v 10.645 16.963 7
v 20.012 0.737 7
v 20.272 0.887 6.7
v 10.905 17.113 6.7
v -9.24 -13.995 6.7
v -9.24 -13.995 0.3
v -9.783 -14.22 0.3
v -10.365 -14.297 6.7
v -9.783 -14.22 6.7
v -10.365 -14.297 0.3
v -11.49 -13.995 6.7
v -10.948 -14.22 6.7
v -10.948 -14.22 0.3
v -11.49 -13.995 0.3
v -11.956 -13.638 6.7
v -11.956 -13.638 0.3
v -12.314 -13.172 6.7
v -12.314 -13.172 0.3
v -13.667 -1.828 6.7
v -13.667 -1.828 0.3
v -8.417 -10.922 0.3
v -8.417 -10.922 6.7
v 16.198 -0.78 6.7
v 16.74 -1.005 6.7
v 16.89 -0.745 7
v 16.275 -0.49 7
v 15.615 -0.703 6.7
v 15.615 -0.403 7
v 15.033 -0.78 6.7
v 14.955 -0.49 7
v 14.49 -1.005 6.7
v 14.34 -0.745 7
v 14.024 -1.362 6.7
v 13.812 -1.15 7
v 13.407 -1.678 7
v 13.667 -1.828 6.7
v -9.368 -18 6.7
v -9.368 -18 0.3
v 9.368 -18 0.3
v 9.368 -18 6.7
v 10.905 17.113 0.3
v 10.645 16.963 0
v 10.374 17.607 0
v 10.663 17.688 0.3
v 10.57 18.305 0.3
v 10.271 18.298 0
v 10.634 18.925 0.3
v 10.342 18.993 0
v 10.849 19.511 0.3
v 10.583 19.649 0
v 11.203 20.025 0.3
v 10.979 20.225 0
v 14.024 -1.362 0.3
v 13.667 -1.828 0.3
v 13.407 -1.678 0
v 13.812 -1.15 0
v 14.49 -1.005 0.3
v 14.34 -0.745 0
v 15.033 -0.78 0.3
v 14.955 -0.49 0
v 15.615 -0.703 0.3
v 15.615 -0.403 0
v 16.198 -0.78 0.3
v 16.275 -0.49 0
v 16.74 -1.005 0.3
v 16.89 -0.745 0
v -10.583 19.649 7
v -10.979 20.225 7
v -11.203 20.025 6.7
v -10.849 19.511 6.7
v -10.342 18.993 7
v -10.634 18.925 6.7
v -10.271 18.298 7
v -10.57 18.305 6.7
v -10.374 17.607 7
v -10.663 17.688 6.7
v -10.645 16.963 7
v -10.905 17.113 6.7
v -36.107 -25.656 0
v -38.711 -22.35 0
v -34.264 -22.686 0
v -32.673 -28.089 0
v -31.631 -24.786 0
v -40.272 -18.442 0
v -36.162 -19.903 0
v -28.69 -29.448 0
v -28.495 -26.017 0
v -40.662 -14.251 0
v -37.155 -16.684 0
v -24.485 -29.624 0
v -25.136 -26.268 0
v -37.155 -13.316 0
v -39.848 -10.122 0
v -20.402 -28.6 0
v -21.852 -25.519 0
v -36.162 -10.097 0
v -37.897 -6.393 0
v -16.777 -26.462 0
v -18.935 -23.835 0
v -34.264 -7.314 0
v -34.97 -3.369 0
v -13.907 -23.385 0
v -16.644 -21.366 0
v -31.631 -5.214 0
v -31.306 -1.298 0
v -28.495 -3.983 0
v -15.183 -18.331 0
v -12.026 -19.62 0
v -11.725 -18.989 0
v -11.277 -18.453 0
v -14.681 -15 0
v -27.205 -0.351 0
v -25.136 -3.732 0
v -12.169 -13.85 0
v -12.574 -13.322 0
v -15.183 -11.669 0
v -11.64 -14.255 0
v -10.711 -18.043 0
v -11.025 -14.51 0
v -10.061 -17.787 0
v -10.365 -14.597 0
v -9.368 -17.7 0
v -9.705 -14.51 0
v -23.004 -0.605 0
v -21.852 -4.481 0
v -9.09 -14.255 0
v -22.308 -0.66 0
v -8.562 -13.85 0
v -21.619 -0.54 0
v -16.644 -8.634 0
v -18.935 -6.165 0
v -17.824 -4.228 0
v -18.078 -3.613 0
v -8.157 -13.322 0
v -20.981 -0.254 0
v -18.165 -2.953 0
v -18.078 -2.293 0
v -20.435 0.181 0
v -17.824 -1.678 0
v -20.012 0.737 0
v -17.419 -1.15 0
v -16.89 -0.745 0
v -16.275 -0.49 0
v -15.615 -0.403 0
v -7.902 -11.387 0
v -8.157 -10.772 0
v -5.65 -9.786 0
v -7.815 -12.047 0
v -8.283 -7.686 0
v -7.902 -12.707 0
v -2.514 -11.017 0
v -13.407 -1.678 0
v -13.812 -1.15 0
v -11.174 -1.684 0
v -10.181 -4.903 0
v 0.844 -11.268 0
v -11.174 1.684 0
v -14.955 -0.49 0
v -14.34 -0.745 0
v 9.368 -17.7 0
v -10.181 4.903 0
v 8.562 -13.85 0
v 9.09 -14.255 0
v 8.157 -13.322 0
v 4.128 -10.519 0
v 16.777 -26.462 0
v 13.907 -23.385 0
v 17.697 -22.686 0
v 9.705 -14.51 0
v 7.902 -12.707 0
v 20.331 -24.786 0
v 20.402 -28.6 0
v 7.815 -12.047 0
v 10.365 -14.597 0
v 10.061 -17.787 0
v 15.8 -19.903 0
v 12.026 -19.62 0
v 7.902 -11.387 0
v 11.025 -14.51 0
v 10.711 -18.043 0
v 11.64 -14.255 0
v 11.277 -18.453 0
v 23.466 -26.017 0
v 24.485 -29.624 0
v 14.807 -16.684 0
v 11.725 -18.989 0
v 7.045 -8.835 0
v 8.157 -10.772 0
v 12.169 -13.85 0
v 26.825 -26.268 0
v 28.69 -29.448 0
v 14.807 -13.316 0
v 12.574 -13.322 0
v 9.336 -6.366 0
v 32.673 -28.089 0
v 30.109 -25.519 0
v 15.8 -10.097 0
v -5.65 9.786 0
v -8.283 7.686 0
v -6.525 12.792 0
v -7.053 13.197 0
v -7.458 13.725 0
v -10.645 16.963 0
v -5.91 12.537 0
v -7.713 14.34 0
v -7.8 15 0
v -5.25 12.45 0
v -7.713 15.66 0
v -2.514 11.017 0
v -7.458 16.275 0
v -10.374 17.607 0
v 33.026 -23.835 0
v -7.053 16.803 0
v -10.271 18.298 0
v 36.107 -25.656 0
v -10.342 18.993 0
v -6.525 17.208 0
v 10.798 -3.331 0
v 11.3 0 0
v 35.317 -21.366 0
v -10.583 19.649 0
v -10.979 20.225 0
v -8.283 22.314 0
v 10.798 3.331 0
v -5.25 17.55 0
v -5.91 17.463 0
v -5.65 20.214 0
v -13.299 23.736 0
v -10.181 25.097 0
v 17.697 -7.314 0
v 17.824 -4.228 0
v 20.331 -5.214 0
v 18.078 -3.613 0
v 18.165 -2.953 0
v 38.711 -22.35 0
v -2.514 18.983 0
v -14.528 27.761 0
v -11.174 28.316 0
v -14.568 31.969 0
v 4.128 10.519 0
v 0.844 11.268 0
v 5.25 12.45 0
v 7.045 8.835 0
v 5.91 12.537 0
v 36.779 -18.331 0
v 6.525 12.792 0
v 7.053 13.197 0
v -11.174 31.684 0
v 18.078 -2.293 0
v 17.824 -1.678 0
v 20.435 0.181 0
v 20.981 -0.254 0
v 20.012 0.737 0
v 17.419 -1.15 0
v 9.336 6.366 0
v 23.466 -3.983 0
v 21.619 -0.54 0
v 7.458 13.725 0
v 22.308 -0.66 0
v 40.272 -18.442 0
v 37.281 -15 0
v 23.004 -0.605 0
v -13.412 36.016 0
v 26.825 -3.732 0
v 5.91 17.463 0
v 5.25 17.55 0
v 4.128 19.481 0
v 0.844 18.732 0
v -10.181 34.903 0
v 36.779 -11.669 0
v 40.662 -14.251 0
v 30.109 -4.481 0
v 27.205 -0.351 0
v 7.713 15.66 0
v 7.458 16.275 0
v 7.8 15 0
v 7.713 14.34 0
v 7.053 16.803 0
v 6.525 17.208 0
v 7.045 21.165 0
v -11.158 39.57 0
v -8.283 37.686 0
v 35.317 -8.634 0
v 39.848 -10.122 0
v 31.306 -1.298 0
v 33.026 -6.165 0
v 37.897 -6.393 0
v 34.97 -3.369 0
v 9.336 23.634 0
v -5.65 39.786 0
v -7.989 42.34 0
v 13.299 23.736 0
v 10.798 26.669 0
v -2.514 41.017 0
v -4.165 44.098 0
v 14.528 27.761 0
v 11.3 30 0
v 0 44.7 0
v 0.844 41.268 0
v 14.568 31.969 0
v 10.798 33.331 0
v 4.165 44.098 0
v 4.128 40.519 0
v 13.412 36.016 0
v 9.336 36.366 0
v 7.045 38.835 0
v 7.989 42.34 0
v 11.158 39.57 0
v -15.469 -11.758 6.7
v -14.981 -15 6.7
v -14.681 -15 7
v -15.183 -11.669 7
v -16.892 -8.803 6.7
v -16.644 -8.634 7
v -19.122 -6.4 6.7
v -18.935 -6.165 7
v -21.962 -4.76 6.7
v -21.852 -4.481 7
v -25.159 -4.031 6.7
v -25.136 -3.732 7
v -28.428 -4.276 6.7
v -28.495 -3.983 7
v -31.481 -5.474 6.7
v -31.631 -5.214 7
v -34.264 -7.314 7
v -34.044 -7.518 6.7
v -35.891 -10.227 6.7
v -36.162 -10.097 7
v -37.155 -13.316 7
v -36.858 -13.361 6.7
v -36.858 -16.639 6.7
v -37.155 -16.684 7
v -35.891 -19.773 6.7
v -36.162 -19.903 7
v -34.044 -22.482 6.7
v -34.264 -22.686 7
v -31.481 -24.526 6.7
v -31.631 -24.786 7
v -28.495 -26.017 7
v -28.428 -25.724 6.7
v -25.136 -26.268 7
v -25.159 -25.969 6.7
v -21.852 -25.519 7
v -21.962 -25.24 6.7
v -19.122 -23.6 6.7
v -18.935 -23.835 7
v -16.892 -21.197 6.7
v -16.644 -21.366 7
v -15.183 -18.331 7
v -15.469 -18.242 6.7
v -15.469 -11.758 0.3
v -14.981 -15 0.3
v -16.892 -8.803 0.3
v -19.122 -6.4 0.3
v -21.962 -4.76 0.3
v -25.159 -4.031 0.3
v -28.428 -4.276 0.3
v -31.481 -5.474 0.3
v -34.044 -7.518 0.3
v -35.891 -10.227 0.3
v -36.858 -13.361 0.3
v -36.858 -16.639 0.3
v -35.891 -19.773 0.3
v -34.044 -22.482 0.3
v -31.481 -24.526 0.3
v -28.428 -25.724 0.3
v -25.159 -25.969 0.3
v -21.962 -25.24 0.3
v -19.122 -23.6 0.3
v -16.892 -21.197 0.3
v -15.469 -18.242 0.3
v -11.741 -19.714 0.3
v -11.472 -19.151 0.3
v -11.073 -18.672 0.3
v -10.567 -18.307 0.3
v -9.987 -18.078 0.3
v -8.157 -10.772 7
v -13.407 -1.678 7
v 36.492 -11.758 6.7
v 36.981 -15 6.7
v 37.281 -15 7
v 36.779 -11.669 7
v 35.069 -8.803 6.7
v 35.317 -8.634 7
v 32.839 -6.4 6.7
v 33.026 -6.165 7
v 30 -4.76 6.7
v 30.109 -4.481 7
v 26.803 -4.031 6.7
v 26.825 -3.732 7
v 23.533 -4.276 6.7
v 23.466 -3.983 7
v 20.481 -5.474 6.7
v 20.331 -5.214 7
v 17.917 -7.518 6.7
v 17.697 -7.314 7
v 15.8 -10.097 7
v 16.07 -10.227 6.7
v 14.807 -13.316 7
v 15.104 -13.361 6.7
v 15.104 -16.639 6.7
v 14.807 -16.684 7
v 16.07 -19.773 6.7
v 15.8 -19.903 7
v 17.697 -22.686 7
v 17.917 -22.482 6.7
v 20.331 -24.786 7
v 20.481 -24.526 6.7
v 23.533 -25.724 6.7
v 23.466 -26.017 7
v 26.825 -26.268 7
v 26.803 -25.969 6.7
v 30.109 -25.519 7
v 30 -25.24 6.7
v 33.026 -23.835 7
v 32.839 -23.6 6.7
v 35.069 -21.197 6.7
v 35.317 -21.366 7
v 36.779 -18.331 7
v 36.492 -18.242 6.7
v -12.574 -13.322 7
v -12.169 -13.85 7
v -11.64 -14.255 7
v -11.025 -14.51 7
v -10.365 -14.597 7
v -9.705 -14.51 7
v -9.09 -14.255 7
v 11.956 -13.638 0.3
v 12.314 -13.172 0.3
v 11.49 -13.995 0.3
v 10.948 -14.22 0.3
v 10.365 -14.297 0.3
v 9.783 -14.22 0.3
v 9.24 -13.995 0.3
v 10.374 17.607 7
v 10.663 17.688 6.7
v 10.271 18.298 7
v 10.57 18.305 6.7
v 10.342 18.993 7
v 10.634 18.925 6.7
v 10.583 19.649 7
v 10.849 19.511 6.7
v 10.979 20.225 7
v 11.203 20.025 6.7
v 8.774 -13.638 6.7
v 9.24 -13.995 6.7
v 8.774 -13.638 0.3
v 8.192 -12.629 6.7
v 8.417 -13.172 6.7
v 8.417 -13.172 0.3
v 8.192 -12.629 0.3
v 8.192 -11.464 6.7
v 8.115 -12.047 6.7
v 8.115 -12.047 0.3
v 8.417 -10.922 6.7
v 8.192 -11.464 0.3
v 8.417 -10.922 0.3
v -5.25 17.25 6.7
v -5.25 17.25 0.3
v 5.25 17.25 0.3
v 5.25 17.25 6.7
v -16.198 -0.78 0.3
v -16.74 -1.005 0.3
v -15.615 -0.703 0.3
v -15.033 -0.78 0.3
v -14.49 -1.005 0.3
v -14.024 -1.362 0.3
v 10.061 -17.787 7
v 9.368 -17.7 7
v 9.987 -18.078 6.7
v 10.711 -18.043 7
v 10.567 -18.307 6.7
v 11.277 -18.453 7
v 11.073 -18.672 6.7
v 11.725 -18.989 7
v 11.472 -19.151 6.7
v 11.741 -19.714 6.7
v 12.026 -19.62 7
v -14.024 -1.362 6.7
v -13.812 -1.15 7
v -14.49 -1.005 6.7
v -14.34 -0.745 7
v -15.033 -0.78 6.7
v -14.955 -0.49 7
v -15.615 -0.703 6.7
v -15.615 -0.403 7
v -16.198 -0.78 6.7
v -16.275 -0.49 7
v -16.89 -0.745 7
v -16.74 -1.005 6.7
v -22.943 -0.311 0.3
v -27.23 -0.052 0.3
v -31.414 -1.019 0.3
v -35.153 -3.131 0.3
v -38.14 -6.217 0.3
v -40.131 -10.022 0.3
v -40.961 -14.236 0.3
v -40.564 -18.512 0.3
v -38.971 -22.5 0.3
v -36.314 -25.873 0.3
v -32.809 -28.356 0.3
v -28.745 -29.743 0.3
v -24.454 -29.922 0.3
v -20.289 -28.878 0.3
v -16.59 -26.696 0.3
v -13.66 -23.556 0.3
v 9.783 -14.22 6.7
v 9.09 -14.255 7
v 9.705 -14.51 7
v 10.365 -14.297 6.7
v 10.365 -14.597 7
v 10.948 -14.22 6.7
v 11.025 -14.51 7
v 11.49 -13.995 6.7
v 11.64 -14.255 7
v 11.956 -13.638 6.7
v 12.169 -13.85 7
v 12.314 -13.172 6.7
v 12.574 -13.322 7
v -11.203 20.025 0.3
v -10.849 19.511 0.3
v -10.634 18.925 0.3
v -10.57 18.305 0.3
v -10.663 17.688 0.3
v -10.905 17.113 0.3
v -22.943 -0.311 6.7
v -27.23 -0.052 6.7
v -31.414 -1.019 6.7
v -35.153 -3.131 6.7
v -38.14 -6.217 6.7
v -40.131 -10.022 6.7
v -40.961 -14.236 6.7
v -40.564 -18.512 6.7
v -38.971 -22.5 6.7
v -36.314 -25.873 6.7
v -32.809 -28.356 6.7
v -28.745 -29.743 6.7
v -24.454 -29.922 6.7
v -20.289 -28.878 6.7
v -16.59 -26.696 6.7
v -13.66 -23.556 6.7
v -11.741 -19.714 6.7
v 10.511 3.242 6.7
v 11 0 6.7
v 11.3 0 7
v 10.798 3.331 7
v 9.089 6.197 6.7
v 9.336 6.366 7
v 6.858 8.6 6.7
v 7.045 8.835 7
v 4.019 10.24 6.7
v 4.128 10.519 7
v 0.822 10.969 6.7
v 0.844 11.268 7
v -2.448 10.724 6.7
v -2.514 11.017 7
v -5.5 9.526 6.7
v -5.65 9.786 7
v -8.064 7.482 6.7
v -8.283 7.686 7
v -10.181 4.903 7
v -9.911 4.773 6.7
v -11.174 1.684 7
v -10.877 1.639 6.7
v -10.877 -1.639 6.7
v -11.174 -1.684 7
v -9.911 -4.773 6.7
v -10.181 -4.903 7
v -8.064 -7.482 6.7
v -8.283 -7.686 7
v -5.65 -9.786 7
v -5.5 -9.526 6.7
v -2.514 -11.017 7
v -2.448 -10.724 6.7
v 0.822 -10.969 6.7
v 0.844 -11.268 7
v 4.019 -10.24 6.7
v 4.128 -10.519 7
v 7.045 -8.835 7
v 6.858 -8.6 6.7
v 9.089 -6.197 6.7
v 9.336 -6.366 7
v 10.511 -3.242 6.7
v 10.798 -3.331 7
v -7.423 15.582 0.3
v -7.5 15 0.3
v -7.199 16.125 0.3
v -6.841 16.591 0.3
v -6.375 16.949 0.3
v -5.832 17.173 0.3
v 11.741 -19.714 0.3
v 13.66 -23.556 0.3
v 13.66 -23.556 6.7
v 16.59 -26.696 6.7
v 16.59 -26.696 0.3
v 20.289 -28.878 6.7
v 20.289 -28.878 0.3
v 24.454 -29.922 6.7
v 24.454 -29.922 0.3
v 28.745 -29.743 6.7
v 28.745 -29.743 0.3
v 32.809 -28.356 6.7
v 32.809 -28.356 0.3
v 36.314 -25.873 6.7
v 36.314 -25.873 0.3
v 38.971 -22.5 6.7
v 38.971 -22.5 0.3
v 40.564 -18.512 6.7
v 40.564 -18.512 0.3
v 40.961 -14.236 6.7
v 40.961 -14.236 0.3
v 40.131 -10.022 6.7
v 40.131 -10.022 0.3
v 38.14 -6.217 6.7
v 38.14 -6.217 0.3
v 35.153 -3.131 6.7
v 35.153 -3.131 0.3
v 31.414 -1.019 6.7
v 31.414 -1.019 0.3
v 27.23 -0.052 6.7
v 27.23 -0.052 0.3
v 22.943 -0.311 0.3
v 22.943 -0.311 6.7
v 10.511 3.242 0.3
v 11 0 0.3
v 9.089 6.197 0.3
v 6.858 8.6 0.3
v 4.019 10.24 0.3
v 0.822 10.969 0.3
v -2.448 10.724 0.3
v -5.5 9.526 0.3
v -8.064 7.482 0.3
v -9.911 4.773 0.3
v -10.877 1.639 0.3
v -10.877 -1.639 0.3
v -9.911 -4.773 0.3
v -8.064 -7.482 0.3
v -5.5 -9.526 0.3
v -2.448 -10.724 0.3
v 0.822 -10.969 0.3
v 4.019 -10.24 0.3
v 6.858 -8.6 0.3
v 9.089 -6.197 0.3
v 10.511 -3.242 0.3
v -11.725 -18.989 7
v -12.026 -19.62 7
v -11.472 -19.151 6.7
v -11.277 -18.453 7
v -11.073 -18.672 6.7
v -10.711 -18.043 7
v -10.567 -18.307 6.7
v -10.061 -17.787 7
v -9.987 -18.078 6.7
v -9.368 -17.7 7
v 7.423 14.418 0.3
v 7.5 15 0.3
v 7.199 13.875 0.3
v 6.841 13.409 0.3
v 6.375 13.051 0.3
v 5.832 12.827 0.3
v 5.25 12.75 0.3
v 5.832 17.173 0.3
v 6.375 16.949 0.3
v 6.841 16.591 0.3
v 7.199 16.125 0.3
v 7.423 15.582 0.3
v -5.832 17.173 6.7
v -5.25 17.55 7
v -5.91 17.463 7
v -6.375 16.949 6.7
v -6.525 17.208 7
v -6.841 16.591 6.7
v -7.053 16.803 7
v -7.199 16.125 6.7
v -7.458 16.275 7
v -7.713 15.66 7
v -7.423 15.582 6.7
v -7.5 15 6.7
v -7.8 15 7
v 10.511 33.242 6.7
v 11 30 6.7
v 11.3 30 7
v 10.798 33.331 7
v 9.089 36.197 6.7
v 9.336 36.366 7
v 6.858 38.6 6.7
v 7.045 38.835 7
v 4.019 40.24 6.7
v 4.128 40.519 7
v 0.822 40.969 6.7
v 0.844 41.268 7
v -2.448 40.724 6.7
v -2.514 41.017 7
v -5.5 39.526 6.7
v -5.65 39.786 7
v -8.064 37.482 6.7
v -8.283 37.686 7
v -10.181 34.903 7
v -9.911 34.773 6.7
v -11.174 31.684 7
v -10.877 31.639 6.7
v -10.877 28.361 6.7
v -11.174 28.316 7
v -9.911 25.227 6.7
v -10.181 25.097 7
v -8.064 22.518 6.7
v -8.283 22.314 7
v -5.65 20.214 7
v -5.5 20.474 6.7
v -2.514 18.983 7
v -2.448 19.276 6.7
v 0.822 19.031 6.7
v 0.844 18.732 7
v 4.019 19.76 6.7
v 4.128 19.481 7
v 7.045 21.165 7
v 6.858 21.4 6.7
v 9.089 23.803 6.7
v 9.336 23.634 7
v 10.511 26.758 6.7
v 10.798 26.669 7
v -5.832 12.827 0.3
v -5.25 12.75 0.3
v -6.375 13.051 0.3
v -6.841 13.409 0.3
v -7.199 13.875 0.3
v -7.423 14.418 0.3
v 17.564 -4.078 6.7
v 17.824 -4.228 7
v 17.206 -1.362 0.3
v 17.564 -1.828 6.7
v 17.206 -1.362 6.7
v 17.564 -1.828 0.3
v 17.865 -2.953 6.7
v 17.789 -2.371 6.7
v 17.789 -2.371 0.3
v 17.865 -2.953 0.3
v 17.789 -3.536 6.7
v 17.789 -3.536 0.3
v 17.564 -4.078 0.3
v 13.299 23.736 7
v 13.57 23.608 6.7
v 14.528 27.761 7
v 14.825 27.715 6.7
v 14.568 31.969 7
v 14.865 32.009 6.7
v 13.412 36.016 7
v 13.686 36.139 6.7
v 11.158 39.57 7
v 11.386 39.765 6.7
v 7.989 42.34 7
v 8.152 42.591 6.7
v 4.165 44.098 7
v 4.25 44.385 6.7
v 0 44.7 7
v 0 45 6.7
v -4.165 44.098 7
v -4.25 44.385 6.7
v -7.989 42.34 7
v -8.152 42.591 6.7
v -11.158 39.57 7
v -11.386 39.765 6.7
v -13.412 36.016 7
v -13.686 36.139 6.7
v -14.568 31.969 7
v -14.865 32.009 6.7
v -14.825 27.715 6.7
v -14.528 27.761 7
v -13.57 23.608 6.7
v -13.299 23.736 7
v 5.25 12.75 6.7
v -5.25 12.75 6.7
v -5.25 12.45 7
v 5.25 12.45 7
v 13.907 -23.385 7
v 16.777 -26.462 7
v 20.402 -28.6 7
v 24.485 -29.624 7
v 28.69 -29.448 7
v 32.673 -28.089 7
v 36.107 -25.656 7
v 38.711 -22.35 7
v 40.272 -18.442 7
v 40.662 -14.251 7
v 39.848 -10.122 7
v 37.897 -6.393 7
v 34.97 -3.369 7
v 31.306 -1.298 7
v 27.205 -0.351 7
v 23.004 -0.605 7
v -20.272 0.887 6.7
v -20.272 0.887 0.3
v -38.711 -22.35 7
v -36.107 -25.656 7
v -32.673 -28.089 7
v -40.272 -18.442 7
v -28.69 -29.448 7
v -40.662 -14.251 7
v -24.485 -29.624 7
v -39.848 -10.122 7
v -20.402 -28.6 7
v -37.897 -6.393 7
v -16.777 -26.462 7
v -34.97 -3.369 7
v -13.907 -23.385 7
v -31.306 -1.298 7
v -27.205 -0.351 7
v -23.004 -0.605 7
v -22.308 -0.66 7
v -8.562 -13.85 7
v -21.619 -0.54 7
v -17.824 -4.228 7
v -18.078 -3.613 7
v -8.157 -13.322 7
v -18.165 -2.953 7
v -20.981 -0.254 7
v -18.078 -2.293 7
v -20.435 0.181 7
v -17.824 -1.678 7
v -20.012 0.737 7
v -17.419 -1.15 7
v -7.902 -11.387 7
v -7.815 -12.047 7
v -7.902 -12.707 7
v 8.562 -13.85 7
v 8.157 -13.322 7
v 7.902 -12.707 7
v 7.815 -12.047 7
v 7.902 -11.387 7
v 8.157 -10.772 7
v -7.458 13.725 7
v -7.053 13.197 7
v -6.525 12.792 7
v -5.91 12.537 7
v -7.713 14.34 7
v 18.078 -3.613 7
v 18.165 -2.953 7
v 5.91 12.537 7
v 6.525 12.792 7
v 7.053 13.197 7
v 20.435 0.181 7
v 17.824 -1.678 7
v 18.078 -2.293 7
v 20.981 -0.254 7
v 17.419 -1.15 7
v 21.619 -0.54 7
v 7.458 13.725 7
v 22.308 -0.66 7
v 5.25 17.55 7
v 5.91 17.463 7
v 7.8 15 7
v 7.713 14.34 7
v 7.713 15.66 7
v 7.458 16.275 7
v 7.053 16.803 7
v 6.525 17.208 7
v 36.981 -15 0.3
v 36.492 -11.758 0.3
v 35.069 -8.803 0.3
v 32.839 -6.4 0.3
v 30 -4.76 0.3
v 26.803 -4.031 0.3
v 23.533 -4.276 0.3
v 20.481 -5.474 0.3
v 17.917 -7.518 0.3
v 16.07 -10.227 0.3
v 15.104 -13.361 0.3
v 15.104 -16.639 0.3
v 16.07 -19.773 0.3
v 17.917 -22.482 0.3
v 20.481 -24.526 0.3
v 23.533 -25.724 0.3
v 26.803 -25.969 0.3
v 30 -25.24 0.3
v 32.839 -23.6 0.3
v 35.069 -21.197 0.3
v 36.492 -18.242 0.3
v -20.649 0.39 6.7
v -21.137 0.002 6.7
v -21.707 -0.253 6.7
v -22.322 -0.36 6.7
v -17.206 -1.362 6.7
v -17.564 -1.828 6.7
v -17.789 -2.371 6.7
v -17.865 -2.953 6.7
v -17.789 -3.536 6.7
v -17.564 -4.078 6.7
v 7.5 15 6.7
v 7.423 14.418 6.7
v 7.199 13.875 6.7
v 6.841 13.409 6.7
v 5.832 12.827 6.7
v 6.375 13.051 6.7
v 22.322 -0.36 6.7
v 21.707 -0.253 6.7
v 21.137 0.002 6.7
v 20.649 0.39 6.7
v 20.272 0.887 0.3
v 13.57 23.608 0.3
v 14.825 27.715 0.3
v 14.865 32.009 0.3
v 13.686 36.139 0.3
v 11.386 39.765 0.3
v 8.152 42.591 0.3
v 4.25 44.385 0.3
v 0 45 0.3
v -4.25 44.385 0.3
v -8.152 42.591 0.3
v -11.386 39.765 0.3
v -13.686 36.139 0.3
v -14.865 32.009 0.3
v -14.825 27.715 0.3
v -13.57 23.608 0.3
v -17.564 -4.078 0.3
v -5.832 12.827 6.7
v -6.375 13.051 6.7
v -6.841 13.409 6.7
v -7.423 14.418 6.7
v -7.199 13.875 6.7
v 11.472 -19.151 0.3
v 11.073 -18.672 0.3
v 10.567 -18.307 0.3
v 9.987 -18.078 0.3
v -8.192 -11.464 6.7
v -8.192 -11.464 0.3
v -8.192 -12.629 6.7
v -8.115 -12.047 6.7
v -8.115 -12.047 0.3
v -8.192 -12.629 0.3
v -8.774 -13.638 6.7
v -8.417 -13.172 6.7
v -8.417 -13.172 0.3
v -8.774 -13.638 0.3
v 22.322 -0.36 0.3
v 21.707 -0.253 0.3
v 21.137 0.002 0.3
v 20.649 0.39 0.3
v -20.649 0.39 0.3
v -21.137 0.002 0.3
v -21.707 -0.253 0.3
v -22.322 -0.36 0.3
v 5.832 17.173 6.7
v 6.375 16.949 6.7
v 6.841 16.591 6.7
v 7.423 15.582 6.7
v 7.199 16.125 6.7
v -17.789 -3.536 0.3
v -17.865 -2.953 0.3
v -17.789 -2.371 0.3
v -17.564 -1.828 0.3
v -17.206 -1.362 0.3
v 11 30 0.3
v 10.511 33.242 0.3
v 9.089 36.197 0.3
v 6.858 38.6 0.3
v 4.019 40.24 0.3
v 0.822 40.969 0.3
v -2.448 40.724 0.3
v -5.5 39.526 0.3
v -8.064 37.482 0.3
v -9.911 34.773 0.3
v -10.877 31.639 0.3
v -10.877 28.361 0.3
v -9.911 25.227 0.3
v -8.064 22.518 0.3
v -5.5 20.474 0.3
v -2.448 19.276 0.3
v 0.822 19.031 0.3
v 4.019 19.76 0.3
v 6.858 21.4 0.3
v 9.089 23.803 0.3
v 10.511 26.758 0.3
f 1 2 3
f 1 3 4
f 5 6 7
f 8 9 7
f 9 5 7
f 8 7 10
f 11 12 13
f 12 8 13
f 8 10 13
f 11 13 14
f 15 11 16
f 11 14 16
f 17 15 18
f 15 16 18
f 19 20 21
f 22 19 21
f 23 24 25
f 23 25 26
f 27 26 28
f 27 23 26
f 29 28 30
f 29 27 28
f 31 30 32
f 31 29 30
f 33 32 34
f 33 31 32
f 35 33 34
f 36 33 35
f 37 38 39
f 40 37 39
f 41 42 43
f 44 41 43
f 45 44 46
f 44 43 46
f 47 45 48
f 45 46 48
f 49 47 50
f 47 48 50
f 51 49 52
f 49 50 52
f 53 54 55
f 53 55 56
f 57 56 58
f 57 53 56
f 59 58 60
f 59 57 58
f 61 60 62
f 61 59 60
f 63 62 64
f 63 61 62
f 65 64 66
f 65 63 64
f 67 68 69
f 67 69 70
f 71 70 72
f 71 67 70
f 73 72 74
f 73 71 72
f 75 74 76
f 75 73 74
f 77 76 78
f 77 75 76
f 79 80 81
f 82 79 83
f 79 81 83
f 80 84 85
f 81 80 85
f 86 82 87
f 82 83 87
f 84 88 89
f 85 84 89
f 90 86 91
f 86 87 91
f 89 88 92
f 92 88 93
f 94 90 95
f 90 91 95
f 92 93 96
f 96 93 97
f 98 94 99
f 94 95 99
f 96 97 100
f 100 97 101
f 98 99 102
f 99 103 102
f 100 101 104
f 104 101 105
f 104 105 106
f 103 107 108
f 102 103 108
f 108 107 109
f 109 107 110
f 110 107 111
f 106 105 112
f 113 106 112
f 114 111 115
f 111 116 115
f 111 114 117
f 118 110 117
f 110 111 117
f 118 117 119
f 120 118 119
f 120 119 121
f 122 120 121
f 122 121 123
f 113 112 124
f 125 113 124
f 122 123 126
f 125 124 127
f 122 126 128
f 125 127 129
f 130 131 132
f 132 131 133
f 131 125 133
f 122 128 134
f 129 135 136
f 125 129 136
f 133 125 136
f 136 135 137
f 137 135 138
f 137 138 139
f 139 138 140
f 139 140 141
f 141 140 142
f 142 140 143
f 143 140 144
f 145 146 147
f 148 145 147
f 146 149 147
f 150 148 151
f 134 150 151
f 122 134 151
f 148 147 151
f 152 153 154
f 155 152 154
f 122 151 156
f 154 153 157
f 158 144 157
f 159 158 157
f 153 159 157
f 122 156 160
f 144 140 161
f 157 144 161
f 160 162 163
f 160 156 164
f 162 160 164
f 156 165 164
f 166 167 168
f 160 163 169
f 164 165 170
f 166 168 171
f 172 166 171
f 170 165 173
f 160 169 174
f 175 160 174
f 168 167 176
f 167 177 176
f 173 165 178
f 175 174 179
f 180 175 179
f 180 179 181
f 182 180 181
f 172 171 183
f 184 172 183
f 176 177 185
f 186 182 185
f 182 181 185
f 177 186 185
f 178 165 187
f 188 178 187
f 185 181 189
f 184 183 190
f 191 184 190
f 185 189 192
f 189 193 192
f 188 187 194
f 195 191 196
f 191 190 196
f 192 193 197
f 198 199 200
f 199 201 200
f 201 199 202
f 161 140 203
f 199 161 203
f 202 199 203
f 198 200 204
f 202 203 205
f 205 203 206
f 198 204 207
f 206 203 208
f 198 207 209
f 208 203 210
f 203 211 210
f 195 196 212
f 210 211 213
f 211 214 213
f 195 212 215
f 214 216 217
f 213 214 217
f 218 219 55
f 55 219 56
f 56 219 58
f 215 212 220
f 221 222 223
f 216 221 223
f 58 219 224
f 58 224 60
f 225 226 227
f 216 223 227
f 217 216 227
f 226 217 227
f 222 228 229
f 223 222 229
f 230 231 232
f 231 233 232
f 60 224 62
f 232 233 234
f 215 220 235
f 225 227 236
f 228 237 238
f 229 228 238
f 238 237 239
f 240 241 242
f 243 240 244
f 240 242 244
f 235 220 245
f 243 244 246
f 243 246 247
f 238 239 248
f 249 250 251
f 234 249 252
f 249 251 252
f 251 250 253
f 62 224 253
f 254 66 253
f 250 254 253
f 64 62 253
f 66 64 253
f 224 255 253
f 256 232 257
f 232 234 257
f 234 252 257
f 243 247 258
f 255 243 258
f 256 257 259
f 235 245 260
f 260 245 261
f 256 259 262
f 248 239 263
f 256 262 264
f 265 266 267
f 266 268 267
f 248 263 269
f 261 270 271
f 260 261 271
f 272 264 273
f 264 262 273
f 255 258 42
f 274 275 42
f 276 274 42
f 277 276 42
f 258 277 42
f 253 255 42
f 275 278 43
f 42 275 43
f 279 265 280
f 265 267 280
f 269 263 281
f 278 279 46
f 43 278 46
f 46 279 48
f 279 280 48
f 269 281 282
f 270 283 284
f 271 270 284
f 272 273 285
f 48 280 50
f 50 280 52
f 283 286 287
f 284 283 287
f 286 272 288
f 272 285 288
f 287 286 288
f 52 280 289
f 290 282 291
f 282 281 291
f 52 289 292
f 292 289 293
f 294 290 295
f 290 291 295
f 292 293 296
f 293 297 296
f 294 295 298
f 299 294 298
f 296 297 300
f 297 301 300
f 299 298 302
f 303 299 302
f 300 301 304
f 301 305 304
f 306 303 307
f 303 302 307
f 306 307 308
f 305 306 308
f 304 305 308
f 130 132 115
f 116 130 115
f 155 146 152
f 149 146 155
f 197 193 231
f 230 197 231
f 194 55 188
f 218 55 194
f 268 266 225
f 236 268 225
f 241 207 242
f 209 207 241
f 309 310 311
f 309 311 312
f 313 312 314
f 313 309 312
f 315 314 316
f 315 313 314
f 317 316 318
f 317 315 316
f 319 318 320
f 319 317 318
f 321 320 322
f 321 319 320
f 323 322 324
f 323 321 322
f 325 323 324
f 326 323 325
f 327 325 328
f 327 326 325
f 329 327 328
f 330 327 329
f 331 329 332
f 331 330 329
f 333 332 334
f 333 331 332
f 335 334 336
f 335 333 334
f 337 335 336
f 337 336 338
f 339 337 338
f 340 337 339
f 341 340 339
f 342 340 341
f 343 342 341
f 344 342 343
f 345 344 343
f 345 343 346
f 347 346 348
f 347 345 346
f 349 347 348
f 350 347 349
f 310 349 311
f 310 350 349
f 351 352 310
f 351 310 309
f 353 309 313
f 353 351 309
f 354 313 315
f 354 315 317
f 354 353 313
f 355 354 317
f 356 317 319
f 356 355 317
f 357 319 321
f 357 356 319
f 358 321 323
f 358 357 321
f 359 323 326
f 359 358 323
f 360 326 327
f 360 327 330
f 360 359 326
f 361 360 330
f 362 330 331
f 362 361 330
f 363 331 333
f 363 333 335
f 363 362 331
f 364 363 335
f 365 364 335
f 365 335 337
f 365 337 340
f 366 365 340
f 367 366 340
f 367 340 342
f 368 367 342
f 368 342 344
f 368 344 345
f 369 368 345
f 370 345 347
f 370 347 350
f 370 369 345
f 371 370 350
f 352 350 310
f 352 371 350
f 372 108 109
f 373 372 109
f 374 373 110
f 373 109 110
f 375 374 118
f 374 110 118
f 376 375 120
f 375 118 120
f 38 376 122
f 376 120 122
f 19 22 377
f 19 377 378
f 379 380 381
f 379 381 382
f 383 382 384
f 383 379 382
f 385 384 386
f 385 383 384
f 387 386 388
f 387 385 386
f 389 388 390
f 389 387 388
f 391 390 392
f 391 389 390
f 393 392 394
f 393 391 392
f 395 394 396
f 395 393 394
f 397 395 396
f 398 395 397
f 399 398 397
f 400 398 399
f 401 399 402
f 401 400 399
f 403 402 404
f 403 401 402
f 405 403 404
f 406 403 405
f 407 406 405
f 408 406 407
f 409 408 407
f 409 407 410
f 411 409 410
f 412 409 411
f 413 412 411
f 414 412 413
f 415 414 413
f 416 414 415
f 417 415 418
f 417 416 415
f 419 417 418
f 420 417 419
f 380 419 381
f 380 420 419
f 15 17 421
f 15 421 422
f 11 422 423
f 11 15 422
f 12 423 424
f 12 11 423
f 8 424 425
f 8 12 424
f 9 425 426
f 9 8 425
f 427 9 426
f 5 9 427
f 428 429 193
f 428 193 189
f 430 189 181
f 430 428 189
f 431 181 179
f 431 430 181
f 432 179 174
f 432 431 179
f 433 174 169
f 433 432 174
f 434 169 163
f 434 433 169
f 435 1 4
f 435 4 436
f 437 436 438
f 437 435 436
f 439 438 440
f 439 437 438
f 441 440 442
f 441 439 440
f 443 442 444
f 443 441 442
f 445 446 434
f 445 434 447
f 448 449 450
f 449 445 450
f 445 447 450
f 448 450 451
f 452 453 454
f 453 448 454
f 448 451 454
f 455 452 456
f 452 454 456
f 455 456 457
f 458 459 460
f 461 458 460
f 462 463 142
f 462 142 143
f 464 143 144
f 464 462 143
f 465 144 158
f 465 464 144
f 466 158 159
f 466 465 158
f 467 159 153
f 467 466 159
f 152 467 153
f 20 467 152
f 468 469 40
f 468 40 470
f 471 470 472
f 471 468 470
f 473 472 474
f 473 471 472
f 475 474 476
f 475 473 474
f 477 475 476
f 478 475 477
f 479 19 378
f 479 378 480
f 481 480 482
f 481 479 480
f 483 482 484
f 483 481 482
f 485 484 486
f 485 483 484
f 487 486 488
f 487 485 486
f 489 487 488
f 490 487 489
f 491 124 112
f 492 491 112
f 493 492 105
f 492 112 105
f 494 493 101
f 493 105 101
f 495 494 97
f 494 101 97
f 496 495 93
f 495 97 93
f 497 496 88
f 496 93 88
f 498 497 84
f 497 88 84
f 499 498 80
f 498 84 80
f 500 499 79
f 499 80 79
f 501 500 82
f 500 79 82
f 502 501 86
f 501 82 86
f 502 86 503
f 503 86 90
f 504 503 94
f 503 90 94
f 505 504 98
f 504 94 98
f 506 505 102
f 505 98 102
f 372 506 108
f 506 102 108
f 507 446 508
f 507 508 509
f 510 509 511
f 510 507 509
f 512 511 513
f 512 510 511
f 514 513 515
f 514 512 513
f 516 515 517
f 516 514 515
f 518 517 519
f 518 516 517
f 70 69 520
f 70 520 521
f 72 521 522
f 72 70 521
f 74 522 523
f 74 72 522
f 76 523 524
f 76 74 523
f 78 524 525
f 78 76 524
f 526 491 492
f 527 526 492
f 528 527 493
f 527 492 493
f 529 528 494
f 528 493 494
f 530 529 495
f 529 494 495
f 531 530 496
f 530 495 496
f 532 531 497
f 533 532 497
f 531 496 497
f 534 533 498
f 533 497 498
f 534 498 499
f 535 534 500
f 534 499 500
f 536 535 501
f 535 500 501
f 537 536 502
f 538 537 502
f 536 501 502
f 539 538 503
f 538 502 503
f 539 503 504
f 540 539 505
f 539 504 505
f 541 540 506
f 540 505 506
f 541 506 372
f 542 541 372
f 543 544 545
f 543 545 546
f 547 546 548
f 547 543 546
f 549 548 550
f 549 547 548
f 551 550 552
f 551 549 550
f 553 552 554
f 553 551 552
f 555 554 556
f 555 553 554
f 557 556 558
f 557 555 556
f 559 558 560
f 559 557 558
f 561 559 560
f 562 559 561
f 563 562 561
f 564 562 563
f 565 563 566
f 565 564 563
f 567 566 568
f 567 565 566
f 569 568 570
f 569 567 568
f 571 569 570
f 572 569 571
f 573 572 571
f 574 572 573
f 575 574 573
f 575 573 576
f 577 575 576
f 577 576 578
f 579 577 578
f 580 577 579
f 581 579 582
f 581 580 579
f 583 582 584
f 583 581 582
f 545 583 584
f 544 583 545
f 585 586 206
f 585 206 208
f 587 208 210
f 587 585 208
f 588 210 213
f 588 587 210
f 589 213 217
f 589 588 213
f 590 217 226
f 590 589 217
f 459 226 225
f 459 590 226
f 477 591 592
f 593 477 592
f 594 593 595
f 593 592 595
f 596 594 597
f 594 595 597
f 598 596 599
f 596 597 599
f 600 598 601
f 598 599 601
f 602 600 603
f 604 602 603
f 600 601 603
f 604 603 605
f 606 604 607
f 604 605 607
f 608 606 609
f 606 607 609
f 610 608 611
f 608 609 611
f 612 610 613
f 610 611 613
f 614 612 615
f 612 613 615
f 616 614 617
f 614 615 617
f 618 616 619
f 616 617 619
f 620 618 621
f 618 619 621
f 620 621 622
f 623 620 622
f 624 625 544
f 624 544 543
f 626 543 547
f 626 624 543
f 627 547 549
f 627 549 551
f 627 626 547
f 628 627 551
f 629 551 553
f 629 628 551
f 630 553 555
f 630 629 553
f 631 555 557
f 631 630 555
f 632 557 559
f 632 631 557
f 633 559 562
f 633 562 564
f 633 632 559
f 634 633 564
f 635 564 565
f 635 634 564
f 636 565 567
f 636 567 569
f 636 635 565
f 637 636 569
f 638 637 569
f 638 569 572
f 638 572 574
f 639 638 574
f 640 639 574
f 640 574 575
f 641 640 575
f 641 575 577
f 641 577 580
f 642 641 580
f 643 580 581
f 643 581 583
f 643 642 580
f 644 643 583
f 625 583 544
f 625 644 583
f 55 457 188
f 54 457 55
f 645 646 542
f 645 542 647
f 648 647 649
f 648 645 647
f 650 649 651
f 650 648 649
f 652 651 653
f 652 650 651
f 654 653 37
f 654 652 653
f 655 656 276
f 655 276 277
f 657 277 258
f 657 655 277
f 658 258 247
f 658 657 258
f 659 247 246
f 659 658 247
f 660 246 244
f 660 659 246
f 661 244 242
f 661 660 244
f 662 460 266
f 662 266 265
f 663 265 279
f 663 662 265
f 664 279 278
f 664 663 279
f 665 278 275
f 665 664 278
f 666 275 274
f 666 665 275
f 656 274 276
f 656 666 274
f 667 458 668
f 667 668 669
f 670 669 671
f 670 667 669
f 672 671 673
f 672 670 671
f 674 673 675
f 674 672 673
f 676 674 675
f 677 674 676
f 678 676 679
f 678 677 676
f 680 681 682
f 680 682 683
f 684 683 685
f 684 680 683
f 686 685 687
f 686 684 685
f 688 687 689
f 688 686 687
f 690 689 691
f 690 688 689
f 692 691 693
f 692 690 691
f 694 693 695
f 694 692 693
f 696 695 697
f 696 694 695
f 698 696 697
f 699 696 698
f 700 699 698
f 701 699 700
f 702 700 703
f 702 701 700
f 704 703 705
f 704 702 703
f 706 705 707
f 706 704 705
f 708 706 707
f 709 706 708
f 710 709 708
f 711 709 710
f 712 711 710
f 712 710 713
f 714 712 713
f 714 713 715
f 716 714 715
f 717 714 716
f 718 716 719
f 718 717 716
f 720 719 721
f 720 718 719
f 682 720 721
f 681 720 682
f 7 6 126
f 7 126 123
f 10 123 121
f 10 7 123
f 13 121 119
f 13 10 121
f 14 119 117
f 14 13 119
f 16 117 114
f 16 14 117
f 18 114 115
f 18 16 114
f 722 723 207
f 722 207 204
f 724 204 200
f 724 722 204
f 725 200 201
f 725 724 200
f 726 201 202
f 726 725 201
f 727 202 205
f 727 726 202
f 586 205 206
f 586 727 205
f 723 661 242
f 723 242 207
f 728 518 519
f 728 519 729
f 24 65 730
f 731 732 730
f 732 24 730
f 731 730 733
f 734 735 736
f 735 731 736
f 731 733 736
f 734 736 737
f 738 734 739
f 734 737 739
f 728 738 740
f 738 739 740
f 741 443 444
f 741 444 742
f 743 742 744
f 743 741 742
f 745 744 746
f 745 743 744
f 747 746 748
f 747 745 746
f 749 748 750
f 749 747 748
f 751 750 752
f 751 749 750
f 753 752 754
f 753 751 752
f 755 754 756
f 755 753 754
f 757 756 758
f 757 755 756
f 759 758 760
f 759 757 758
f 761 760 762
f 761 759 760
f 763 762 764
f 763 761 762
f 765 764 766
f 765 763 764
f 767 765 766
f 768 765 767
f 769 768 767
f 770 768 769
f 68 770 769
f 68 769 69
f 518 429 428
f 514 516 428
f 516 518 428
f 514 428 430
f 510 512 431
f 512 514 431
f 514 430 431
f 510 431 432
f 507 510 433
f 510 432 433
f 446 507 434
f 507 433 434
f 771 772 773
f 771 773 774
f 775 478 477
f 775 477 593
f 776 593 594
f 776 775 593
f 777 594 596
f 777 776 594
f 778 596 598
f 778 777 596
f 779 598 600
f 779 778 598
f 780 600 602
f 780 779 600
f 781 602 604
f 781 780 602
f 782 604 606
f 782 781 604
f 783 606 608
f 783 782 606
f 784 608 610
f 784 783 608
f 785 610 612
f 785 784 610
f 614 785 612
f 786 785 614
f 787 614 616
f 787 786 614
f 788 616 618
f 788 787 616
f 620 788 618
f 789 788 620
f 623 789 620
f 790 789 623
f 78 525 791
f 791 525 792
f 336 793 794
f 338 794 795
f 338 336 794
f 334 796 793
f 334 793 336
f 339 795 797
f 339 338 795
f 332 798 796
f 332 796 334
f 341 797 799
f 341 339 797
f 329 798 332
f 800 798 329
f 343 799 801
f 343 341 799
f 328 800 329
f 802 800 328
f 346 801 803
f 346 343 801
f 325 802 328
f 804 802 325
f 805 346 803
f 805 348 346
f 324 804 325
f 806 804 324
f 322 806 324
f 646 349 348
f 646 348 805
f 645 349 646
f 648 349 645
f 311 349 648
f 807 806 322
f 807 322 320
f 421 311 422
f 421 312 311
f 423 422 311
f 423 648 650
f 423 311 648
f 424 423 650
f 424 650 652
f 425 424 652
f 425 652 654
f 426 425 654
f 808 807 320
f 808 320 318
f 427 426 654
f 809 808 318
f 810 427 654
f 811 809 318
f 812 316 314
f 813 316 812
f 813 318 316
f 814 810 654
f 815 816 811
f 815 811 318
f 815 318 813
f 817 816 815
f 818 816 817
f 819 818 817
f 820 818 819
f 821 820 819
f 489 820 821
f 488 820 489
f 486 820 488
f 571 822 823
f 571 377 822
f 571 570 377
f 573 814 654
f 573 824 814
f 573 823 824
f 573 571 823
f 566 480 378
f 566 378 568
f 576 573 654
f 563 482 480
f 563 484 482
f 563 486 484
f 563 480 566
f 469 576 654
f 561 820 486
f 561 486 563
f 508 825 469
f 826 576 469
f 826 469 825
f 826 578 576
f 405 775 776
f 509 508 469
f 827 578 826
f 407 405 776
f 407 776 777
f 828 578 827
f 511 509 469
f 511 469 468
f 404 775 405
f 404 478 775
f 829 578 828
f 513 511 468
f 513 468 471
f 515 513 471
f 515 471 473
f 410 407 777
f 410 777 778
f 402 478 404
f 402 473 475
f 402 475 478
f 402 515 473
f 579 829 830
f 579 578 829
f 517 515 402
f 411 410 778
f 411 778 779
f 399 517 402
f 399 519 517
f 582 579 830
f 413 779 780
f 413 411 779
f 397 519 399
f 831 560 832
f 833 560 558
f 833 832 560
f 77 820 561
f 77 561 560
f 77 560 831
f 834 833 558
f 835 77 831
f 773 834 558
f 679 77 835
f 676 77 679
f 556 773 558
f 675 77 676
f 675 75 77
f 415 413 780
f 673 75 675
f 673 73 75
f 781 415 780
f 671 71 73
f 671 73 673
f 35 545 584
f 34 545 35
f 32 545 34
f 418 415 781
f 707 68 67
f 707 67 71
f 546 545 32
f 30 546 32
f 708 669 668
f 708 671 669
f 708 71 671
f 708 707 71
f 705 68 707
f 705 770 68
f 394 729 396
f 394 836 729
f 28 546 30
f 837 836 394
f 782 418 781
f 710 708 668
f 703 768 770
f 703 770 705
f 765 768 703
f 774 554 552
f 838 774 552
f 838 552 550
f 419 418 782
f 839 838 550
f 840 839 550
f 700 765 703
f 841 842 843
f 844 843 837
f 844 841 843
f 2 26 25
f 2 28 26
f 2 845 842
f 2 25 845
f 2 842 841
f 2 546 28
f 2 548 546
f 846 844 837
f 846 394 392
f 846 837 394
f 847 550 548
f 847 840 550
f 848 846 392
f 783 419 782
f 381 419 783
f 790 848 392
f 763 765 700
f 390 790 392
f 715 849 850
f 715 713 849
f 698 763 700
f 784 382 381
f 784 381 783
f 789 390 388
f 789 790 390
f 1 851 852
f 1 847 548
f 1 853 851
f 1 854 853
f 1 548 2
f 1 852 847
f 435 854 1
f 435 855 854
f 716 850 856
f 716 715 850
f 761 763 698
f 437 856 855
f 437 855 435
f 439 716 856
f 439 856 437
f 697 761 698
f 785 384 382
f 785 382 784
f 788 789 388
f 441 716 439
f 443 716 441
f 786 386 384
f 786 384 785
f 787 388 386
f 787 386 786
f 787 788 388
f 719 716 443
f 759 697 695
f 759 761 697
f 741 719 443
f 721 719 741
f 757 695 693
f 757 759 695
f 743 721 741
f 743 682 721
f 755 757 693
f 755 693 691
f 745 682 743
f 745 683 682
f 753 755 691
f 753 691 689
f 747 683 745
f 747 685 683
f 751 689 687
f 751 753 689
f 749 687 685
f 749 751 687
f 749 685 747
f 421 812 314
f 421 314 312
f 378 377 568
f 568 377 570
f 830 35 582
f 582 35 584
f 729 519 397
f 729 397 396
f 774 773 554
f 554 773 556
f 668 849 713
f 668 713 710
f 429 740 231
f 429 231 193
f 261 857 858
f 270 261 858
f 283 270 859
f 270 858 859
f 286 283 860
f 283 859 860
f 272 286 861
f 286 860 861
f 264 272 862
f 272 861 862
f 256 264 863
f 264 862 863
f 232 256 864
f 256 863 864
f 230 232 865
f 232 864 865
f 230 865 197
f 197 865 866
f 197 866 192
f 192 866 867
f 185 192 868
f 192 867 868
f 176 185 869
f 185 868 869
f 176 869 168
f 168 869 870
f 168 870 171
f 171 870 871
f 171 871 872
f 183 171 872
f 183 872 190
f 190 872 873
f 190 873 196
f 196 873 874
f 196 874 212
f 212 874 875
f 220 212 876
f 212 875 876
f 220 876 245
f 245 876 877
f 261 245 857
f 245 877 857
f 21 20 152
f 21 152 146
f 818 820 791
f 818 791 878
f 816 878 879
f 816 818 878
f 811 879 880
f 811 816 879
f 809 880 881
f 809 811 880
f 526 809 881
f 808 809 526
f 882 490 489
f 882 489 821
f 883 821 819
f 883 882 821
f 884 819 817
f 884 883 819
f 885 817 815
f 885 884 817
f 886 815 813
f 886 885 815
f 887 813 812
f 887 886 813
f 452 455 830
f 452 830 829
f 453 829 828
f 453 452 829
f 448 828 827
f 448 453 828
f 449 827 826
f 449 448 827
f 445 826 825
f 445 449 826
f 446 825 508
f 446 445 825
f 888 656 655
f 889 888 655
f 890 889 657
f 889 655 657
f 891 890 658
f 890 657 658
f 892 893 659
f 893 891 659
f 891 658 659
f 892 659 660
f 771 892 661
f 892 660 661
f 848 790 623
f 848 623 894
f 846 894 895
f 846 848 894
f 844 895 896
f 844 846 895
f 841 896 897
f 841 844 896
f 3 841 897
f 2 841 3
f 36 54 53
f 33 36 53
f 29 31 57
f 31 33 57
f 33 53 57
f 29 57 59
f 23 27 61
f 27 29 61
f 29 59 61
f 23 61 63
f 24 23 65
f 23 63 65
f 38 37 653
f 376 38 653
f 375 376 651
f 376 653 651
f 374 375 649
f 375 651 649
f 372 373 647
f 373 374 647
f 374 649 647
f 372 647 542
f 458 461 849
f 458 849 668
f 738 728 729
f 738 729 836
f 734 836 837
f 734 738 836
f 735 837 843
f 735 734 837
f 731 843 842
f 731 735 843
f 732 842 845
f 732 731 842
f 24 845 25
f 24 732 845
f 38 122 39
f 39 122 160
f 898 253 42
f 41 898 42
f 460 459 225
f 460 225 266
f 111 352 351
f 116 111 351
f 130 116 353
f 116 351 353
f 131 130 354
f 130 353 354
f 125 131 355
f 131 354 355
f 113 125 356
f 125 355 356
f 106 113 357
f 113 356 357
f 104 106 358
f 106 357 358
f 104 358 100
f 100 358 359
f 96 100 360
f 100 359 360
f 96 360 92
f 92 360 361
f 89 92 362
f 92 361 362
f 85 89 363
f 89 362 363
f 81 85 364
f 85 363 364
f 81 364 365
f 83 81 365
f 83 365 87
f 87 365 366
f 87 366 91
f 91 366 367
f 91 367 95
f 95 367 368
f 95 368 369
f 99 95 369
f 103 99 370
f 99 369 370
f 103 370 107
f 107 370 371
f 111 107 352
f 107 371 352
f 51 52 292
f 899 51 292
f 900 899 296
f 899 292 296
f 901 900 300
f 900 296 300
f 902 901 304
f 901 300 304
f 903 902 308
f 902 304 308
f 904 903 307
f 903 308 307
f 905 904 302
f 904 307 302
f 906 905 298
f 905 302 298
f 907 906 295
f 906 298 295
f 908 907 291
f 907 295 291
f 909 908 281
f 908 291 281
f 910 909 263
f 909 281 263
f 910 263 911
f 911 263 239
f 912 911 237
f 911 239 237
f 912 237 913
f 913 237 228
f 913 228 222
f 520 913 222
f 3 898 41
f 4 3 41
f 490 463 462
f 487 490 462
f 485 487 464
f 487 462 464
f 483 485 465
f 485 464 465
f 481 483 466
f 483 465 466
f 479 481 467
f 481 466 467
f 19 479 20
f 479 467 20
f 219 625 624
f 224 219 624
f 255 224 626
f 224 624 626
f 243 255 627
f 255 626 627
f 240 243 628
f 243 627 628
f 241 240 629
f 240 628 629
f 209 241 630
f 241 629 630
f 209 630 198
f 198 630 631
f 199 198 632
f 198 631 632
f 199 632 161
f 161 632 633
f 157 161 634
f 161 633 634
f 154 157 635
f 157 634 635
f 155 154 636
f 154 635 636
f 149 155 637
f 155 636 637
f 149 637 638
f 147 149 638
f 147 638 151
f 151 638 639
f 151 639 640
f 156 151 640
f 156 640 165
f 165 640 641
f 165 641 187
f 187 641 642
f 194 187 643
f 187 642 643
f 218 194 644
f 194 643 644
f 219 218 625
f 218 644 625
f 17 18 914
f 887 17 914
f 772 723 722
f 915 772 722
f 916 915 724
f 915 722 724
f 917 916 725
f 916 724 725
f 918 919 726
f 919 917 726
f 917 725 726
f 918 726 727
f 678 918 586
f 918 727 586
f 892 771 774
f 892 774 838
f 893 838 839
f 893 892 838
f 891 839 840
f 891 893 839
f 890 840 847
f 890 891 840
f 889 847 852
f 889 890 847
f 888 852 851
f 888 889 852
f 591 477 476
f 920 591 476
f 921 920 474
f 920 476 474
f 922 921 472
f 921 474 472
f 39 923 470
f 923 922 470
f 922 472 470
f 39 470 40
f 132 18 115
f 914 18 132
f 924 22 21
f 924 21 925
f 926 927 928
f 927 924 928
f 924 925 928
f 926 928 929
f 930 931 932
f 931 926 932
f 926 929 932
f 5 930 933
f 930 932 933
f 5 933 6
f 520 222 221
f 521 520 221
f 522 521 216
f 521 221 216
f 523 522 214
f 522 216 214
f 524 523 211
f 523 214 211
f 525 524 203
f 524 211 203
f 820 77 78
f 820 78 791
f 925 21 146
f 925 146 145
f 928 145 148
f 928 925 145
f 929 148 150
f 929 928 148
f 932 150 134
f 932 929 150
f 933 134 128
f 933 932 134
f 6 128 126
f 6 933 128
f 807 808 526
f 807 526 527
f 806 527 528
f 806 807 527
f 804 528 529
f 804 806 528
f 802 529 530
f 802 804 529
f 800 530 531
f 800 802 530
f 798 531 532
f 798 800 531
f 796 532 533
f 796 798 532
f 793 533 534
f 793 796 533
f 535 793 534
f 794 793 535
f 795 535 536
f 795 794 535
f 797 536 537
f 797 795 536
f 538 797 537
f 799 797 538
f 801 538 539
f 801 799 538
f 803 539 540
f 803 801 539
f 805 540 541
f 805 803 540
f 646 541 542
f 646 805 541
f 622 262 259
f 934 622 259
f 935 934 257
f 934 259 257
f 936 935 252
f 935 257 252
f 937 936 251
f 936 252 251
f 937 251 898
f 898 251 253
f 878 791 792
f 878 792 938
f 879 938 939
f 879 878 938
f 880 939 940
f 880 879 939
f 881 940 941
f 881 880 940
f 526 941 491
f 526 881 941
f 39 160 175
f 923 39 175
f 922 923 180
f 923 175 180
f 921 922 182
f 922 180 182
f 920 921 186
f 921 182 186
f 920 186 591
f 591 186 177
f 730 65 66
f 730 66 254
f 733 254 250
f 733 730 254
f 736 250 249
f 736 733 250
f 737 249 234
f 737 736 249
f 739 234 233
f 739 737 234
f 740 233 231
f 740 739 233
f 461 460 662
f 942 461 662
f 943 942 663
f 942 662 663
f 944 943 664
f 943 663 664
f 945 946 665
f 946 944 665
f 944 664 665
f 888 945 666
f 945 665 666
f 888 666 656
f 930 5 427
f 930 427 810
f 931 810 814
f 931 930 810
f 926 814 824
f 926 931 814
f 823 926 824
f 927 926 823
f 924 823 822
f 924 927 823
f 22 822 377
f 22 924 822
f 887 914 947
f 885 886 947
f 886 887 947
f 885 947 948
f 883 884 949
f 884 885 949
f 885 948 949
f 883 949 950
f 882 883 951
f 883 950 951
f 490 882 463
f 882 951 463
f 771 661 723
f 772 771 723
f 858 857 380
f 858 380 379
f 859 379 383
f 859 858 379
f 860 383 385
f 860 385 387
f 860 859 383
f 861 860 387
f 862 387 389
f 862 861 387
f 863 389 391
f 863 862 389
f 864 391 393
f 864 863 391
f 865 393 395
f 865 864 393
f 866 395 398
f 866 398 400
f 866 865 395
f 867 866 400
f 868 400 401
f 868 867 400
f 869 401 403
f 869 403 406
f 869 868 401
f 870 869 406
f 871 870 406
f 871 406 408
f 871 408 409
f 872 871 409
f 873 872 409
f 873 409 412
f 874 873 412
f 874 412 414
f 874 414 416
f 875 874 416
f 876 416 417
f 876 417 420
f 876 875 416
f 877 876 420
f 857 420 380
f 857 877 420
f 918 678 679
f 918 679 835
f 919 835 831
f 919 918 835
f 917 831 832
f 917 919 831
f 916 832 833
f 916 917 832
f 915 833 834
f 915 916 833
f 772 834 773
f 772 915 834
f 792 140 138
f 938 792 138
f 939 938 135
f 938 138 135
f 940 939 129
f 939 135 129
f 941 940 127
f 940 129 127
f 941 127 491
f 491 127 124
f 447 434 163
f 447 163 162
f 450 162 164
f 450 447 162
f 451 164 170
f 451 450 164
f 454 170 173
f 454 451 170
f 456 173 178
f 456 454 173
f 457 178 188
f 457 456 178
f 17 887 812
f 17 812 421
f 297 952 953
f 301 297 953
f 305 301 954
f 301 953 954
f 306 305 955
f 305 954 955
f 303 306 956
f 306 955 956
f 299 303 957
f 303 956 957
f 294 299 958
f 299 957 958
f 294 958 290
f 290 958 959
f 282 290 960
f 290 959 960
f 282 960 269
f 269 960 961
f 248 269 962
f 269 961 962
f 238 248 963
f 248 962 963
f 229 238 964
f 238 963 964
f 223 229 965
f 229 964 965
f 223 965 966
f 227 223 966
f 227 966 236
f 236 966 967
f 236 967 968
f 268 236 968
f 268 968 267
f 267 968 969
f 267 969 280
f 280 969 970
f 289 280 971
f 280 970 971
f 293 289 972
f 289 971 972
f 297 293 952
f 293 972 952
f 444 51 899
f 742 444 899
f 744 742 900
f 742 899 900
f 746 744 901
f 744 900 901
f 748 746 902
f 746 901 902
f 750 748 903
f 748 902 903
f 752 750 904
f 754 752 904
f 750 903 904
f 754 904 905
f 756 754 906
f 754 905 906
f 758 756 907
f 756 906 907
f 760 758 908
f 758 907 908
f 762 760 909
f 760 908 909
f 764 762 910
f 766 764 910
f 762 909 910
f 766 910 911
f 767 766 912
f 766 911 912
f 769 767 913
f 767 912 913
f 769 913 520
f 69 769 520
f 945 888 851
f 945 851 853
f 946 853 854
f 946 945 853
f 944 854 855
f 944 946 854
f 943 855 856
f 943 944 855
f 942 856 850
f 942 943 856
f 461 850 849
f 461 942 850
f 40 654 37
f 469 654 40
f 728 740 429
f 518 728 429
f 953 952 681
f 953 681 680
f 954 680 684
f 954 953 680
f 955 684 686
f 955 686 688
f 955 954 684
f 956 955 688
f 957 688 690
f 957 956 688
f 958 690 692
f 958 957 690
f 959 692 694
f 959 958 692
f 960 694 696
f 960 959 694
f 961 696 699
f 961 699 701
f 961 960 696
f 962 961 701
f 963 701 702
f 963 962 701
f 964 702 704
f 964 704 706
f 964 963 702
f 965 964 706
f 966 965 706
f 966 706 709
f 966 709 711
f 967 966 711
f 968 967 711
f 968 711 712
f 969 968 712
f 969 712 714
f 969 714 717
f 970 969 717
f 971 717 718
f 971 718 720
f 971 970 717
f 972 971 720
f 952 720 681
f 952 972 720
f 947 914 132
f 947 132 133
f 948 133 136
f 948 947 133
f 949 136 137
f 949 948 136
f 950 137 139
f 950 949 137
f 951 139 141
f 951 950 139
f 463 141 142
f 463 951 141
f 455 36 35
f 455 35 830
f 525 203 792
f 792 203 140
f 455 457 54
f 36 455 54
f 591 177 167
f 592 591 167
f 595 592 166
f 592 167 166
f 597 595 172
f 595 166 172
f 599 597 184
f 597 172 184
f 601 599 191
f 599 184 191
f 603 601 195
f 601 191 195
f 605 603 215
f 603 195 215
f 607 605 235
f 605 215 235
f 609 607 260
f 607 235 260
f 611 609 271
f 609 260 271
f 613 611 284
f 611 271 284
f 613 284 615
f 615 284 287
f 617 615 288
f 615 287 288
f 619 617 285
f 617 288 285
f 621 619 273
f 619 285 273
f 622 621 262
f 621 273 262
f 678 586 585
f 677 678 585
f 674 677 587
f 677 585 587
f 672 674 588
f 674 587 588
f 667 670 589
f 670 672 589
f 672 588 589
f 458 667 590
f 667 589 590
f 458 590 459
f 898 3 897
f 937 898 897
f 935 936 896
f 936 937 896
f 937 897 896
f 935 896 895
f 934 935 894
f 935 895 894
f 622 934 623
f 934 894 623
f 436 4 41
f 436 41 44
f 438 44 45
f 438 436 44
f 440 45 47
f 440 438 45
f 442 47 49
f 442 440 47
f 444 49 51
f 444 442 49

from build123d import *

# Parameters (mm, degrees)
F0_R     = 11
F1_DEPTH = 7
F2_R     = 2.5
F4_DEPTH = 25
F5_SIZE  = 0.3


with BuildPart() as f1:
    # F0 (on Top) → F1 (new body)
    with BuildSketch(Plane.XY):
        with BuildLine():
            Line((21.230369, -0.772078), (9.946545, 18.772078))
            ThreePointArc((9.946545, 18.772078), (0, 45), (-9.946545, 18.772078))
            Line((-9.946545, 18.772078), (-21.230369, -0.772078))
            ThreePointArc((-21.230369, -0.772078), (-38.971143, -22.5), (-11.283824, -18))
            Line((-11.283824, -18), (11.283824, -18))
            ThreePointArc((11.283824, -18), (38.971143, -22.5), (21.230369, -0.772078))
        make_face()
        with Locations((-25.980762, -15)):
            Circle(F0_R, mode=Mode.SUBTRACT)
        with Locations((25.980762, -15)):
            Circle(F0_R, mode=Mode.SUBTRACT)
        Circle(F0_R, mode=Mode.SUBTRACT)
        with Locations((0, 30)):
            Circle(F0_R, mode=Mode.SUBTRACT)
    extrude(amount=F1_DEPTH)

    # F2
    f2_edges = [f1.edges().sort_by_distance(p)[0] for p in [
        (11.283824, -18, 3.5),
        (-11.283824, -18, 3.5),
        (-21.230369, -0.772078, 3.5),
        (9.946545, 18.772078, 3.5),
        (21.230369, -0.772078, 3.5),
        (-9.946545, 18.772078, 3.5),
    ]]
    fillet(f2_edges, radius=F2_R)

    # F3 (on face) → F4 (cut)
    with BuildSketch(Plane(origin=(0, 0, 0), x_dir=(1, 0, 0), z_dir=(0, 0, -1))):
        with BuildLine():
            ThreePointArc((7.5, -15), (6.84099, -13.40901), (5.25, -12.75))
            Line((5.25, -12.75), (-5.25, -12.75))
            ThreePointArc((-5.25, -12.75), (-6.84099, -13.40901), (-7.5, -15))
            ThreePointArc((-7.5, -15), (-6.84099, -16.59099), (-5.25, -17.25))
            Line((-5.25, -17.25), (5.25, -17.25))
            ThreePointArc((5.25, -17.25), (6.84099, -16.59099), (7.5, -15))
        make_face()
        with BuildLine():
            ThreePointArc((13.666824, 1.828367), (15.033038, 0.780034), (16.740381, 1.004809))
            ThreePointArc((16.740381, 1.004809), (17.788714, 2.371024), (17.563938, 4.078367))
            Line((17.563938, 4.078367), (12.313938, 13.171633))
            ThreePointArc((12.313938, 13.171633), (10.947724, 14.219966), (9.240381, 13.995191))
            ThreePointArc((9.240381, 13.995191), (8.192048, 12.628976), (8.416824, 10.921633))
            Line((8.416824, 10.921633), (13.666824, 1.828367))
        make_face()
        with BuildLine():
            ThreePointArc((-8.416824, 10.921633), (-8.192048, 12.628976), (-9.240381, 13.995191))
            ThreePointArc((-9.240381, 13.995191), (-10.947724, 14.219966), (-12.313938, 13.171633))
            Line((-12.313938, 13.171633), (-17.563938, 4.078367))
            ThreePointArc((-17.563938, 4.078367), (-17.788714, 2.371024), (-16.740381, 1.004809))
            ThreePointArc((-16.740381, 1.004809), (-15.033038, 0.780034), (-13.666824, 1.828367))
            Line((-13.666824, 1.828367), (-8.416824, 10.921633))
        make_face()
    extrude(amount=-F4_DEPTH, mode=Mode.SUBTRACT)

    # F5
    f5_edges = [f1.edges().sort_by_distance(p)[0] for p in [
        (15.588457, 9, 0),
        (21.414108, -0.143541, 0),
        (10.582744, 18.616932, 0),
        (38.971143, -22.5, 0),
        (0, 45, 0),
        (10.831364, -18.473391, 0),
        (-10.582744, 18.616932, 0),
        (0, -18, 0),
        (-15.588457, 9, 0),
        (-10.831364, -18.473391, 0),
        (-21.414108, -0.143541, 0),
        (-38.971143, -22.5, 0),
        (-36.980762, -15, 0),
        (-9.240381, -13.995191, 0),
        (-11.041824, -6.375, 0),
        (-16.740381, -1.004809, 0),
        (-14.938938, -8.625, 0),
        (14.980762, -15, 0),
        (9.240381, -13.995191, 0),
        (14.938938, -8.625, 0),
        (16.740381, -1.004809, 0),
        (11.041824, -6.375, 0),
        (-11, 0, 0),
        (7.5, 15, 0),
        (0, 17.25, 0),
        (-7.5, 15, 0),
        (0, 12.75, 0),
        (-11, 30, 0),
        (15.588457, 9, 7),
        (21.414108, -0.143541, 7),
        (10.582744, 18.616932, 7),
        (38.971143, -22.5, 7),
        (0, 45, 7),
        (10.831364, -18.473391, 7),
        (-10.582744, 18.616932, 7),
        (0, -18, 7),
        (-15.588457, 9, 7),
        (-10.831364, -18.473391, 7),
        (-21.414108, -0.143541, 7),
        (-38.971143, -22.5, 7),
        (-36.980762, -15, 7),
        (-11.041824, -6.375, 7),
        (-16.740381, -1.004809, 7),
        (-14.938938, -8.625, 7),
        (-9.240381, -13.995191, 7),
        (14.980762, -15, 7),
        (11.041824, -6.375, 7),
        (9.240381, -13.995191, 7),
        (14.938938, -8.625, 7),
        (16.740381, -1.004809, 7),
        (-11, 0, 7),
        (0, 17.25, 7),
        (-7.5, 15, 7),
        (0, 12.75, 7),
        (7.5, 15, 7),
        (-11, 30, 7),
    ]]
    chamfer(f5_edges, length=F5_SIZE)


solid = f1.part
